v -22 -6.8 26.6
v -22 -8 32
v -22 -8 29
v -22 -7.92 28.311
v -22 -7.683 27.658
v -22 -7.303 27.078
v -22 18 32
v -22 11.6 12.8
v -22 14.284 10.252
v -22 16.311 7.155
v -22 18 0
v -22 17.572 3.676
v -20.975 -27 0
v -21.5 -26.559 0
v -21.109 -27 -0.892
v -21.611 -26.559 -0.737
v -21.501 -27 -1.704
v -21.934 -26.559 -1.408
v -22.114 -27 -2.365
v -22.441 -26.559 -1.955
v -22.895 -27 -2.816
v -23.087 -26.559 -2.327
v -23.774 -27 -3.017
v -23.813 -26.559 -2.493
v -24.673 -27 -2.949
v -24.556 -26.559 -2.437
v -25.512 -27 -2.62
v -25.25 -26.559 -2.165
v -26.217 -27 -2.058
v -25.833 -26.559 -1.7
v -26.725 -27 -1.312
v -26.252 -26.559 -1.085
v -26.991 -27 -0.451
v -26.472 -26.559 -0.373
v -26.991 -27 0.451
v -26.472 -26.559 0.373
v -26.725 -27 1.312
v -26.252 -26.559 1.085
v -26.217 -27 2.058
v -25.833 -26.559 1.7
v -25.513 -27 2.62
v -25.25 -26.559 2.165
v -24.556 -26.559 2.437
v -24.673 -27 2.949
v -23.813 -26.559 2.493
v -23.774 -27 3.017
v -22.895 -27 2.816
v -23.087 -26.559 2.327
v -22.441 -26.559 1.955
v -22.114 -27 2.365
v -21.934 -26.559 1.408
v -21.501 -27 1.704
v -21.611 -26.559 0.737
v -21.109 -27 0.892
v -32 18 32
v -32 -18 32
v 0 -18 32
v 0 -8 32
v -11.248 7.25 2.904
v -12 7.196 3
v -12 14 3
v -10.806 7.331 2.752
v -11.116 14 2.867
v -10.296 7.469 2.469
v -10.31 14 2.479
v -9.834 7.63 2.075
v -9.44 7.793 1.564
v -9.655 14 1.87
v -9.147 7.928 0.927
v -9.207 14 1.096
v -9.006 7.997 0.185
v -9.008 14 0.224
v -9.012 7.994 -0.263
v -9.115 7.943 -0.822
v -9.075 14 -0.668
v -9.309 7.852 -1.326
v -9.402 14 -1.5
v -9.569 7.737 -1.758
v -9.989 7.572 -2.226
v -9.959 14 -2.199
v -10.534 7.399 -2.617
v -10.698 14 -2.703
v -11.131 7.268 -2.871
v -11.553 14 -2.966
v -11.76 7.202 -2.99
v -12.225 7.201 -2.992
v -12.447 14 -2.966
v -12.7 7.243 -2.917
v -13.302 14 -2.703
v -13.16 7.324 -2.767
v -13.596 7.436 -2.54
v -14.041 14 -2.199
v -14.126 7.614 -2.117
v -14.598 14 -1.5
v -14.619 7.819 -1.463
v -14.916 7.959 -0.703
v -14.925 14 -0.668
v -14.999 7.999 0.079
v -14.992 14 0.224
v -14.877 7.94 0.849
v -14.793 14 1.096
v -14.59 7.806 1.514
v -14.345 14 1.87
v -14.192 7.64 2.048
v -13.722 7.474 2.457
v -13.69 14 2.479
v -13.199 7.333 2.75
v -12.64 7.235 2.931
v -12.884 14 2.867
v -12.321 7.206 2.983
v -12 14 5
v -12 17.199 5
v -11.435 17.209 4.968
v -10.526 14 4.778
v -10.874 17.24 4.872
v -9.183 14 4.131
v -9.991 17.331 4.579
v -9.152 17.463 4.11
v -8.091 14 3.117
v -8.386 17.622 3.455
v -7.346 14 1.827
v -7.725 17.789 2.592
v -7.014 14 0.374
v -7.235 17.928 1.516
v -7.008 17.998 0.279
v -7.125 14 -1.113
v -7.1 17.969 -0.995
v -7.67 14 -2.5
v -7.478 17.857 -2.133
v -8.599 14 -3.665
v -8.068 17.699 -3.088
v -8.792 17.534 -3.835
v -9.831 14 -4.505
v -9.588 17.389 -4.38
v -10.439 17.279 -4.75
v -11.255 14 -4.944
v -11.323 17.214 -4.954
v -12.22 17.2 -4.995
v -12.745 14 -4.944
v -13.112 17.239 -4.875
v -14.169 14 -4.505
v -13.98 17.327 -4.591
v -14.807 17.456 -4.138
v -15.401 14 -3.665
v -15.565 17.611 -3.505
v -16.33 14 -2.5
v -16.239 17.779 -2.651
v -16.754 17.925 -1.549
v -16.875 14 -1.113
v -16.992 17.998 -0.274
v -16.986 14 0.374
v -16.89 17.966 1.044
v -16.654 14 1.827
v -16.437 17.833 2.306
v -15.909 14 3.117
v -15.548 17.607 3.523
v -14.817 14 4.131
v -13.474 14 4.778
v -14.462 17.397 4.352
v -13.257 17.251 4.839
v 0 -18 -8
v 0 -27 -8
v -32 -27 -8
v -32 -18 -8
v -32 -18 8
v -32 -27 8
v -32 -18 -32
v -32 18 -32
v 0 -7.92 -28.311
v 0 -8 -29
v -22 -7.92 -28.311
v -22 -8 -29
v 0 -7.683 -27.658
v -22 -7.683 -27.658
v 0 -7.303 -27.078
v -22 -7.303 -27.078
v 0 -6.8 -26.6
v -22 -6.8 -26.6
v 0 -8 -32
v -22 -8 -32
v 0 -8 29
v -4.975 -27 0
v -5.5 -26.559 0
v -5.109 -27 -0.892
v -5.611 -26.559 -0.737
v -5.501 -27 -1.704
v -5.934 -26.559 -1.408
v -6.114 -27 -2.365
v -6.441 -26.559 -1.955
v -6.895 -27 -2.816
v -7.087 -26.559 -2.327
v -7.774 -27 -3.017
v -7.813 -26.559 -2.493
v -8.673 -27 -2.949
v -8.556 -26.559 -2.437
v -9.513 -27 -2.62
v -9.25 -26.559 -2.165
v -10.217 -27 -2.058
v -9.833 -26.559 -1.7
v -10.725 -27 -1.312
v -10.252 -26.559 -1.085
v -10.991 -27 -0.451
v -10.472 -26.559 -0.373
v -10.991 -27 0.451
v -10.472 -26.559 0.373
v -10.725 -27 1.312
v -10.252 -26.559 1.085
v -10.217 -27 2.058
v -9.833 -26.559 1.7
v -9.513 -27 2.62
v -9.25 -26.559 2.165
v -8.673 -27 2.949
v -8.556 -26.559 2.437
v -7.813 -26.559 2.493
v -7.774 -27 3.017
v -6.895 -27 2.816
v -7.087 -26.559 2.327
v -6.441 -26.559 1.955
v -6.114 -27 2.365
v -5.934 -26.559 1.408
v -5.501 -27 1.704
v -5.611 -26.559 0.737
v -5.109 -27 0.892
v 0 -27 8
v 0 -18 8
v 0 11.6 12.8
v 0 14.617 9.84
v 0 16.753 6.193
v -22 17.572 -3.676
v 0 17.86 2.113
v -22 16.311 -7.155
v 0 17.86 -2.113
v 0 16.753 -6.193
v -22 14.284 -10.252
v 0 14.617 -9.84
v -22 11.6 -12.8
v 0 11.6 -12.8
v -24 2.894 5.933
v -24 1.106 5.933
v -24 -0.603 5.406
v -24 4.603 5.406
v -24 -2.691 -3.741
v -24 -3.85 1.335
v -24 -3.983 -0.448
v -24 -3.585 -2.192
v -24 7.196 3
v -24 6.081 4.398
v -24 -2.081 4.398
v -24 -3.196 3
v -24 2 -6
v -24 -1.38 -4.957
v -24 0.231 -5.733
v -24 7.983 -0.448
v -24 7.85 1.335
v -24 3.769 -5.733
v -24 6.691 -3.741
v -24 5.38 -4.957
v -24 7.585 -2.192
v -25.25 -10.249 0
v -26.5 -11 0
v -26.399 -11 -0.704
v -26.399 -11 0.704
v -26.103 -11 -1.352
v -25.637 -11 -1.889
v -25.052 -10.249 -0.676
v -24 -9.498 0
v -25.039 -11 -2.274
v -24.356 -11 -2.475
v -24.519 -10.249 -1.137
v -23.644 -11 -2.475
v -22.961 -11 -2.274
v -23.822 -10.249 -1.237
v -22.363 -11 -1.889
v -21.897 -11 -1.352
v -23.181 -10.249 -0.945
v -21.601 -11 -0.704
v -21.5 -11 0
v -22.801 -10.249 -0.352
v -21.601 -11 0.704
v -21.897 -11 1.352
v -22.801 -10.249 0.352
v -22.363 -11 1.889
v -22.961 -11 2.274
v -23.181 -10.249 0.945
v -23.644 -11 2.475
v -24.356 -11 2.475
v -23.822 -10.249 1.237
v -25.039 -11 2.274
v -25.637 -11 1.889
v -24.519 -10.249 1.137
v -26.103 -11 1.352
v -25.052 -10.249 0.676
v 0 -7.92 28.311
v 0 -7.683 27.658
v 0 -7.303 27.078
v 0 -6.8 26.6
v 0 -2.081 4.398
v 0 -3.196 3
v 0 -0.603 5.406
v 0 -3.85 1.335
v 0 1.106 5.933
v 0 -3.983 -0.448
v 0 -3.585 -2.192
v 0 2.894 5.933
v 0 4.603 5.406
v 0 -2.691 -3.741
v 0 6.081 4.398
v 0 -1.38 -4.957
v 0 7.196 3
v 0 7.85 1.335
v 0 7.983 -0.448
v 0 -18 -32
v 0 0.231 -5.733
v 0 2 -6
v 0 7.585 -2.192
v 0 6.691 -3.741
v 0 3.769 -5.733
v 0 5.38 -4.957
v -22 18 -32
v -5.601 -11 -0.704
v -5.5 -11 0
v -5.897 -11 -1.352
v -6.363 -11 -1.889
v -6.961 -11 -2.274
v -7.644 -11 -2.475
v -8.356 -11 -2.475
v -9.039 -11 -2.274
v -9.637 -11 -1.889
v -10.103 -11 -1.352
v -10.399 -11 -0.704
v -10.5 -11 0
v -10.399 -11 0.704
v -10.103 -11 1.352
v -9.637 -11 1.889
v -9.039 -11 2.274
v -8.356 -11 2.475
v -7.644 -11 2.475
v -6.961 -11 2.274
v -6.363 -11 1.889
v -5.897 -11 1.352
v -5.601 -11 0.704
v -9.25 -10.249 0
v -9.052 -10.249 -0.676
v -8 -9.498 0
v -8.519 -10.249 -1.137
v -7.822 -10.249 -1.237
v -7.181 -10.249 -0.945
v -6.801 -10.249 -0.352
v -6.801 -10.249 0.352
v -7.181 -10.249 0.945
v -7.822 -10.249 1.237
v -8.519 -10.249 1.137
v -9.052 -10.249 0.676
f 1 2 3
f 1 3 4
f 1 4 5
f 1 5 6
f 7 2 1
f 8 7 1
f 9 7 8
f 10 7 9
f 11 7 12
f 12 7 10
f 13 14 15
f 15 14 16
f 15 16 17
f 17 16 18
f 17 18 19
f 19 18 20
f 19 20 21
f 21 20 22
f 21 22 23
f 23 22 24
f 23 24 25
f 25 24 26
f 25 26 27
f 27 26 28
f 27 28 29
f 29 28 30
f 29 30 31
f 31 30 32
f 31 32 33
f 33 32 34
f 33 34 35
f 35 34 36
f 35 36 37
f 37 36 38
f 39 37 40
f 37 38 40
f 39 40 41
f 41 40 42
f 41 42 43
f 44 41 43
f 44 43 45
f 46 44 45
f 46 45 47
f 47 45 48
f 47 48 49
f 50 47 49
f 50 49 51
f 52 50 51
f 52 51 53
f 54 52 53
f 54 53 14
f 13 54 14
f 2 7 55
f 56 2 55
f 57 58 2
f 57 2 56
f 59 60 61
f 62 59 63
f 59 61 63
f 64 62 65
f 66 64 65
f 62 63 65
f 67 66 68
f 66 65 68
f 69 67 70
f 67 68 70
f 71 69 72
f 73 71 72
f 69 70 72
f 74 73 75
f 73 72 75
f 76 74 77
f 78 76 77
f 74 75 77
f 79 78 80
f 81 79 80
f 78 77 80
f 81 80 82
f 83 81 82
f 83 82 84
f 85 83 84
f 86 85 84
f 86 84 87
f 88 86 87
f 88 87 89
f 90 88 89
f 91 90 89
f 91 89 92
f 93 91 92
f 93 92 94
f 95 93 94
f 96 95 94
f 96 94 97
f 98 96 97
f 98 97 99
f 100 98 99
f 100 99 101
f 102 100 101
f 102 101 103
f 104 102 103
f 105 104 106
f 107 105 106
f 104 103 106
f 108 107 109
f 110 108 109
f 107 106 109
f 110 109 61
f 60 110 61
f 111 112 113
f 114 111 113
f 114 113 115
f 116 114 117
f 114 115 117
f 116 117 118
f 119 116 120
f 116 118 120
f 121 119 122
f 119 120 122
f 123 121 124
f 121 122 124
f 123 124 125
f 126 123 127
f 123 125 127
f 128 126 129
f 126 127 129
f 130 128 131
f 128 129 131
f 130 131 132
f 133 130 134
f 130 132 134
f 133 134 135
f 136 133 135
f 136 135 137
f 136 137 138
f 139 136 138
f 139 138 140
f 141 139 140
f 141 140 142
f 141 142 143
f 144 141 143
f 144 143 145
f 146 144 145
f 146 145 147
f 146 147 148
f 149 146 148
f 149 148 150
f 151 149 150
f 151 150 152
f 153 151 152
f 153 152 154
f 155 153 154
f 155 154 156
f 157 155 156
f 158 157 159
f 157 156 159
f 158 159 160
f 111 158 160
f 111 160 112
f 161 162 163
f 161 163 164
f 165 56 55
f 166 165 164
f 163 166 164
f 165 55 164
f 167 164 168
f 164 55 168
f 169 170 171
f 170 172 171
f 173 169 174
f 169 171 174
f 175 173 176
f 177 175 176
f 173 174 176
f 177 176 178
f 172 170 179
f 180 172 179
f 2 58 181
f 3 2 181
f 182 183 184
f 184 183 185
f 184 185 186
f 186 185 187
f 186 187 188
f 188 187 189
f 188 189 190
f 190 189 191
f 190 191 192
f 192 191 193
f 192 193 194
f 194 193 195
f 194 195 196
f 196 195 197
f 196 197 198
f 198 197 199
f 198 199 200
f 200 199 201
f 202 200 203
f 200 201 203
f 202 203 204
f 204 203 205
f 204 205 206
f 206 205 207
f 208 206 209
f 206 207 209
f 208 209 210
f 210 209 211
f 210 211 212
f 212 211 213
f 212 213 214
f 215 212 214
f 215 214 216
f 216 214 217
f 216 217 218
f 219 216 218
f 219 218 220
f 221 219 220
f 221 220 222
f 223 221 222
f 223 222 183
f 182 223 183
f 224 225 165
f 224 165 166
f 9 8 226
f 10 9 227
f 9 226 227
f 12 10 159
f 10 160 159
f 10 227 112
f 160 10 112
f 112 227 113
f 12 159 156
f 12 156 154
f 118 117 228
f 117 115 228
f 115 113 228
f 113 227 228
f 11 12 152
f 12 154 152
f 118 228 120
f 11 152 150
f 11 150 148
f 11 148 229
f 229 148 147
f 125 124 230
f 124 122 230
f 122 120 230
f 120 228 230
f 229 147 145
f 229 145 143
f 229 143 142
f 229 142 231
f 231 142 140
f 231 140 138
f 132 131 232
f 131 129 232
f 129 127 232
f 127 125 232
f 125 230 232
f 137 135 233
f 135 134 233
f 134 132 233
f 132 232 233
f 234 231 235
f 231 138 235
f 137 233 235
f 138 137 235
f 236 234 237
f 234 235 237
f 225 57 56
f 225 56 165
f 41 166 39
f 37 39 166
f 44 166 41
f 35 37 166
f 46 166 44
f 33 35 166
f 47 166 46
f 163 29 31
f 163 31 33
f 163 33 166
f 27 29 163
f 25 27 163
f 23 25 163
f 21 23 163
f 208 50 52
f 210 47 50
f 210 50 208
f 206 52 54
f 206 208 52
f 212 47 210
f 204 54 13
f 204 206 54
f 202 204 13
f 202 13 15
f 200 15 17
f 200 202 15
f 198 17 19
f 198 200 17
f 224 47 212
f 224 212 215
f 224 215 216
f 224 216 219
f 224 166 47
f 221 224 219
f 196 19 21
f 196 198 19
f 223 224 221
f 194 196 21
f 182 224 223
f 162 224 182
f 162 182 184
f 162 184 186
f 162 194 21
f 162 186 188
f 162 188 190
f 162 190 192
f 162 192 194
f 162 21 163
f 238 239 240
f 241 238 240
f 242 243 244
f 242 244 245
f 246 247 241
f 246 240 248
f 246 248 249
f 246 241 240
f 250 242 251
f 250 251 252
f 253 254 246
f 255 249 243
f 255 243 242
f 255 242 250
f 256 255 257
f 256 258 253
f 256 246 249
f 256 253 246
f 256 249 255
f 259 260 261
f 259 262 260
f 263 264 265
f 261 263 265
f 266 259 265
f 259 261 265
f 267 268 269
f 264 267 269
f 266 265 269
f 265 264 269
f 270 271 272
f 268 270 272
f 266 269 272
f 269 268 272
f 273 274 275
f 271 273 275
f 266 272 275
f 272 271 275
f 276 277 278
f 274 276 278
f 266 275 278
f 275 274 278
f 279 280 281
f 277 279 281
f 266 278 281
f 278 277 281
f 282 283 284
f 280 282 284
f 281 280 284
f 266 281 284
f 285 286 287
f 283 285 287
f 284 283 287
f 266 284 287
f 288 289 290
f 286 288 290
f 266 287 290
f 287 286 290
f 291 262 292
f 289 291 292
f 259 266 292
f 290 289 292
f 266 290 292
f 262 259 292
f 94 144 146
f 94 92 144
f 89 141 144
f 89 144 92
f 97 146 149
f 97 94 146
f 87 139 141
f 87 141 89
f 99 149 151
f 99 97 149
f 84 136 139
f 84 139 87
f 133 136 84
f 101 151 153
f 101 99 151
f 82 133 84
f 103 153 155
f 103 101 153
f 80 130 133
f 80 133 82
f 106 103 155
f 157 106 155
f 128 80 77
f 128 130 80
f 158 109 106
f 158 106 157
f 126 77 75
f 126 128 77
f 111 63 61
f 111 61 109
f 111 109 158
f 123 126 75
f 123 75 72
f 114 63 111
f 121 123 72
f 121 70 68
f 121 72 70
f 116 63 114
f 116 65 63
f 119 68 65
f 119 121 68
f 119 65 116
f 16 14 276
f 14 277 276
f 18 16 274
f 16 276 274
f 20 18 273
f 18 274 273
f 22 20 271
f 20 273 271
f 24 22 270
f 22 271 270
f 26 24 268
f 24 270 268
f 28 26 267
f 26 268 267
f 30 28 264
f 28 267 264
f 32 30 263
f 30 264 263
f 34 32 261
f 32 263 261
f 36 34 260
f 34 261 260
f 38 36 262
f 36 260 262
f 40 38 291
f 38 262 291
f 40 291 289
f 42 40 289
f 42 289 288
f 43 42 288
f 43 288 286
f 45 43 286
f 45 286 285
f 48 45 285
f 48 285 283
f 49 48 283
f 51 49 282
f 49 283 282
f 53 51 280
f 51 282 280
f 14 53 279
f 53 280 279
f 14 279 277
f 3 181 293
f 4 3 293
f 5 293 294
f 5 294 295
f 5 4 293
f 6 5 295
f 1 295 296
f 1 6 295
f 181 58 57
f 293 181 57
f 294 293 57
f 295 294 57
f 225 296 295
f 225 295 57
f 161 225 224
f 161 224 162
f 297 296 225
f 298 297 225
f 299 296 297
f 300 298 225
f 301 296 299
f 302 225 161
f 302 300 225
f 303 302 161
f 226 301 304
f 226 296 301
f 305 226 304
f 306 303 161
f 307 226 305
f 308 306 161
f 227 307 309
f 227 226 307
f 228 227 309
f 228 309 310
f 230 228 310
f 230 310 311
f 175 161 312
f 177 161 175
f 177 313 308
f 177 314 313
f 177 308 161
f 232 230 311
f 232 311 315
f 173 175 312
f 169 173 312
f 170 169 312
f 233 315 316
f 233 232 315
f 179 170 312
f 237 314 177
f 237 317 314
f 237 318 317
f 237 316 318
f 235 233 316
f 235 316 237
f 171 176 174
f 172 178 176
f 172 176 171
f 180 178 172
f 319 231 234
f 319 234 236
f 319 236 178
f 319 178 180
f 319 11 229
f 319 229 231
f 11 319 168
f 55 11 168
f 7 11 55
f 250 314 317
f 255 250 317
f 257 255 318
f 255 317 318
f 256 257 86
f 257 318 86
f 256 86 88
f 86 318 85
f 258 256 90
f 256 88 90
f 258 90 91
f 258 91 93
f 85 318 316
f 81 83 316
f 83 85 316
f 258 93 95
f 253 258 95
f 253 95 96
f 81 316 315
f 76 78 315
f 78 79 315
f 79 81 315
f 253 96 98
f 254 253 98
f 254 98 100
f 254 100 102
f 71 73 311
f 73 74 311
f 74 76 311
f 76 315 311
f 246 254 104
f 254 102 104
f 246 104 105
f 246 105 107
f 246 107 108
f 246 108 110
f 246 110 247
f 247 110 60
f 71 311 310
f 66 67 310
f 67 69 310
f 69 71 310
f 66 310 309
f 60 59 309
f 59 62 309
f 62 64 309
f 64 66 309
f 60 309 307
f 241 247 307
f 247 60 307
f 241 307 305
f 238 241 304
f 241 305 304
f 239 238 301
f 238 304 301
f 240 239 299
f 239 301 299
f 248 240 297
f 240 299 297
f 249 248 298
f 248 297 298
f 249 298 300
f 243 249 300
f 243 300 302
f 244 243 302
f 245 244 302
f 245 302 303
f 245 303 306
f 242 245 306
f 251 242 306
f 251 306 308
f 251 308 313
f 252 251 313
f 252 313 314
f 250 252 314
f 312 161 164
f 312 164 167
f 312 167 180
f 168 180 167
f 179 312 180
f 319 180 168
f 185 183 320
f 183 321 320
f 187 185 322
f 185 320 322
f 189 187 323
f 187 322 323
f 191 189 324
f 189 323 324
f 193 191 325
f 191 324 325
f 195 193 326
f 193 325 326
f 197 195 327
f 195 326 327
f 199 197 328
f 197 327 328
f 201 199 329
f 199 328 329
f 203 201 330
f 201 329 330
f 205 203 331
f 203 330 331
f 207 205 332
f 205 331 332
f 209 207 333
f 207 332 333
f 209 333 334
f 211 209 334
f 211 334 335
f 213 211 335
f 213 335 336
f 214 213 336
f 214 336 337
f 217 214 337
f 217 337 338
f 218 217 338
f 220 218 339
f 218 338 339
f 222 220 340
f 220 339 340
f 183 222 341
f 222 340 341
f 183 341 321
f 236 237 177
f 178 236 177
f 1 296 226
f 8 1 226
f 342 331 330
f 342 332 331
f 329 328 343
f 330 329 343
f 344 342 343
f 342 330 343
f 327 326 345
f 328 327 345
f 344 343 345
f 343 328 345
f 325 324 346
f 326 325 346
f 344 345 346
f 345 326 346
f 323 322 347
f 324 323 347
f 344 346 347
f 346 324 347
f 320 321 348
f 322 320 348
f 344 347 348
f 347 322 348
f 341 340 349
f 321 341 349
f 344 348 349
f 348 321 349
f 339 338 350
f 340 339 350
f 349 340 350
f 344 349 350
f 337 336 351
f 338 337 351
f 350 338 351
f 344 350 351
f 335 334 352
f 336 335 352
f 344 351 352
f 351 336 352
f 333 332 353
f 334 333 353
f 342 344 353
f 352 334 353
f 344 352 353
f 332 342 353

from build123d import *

# Parameters (mm, degrees)
BOSS_EXTRUDE1_DEPTH             = 32
SKETCH3_OUTSIDE_W               = 82.906
SKETCH3_OUTSIDE_H               = 63.906
CUT_EXTRUDE1_DEPTH              = 22
SKETCH6_R                       = 6
CUT_EXTRUDE2_DEPTH              = 24
CUT_EXTRUDE3_REACH              = 65.82
CUT_EXTRUDE3_END_RADIUS         = 6
SKETCH7_R                       = 3
SKETCH8_R                       = 5
CUT_EXTRUDE4_DEPTH              = 4
M6X1_0_TAPPED_HOLE2_D           = 5
M6X1_0_TAPPED_HOLE2_DEPTH       = 16
M6X1_0_TAPPED_HOLE2_CSINK_D     = 6.05
M6X1_0_TAPPED_HOLE2_CSINK_ANGLE = 100
M6X1_0_TAPPED_HOLE2_TIP         = 1.502151548
FILLET1_R                       = 3


with BuildPart() as part:
    # Sketch1 → Boss-Extrude1 (new body)
    with BuildSketch(Plane(origin=(0, 0, 0), x_dir=(0, 0, -1), z_dir=(1, 0, 0))):
        Polygon((8, -18), (32, -18), (32, 18), (-32, 18), (-32, -18), (-8, -18), (-8, -27), (8, -27), align=None)
    extrude(amount=-BOSS_EXTRUDE1_DEPTH)

    # Sketch3 outside → Cut-Extrude1 (cut)
    with BuildSketch(Plane(origin=(0, 0, 0), x_dir=(0, 0, -1), z_dir=(1, 0, 0))):
        with Locations((0, -4.5)):
            Rectangle(SKETCH3_OUTSIDE_W, SKETCH3_OUTSIDE_H)
        with BuildLine():
            Line((-27.5, -8), (-12.8, 11.6))
            ThreePointArc((-12.8, 11.6), (0, 18), (12.8, 11.6))
            Line((12.8, 11.6), (27.5, -8))
            Line((27.5, -8), (32, -8))
            Line((32, -8), (32, -18))
            Line((32, -18), (8, -18))
            Line((8, -18), (8, -27))
            Line((8, -27), (-8, -27))
            Line((-8, -27), (-8, -18))
            Line((-8, -18), (-32, -18))
            Line((-32, -18), (-32, -8))
            Line((-32, -8), (-27.5, -8))
        make_face(mode=Mode.SUBTRACT)
    extrude(amount=-CUT_EXTRUDE1_DEPTH, mode=Mode.SUBTRACT)

    # Sketch6 → Cut-Extrude2 (cut)
    with BuildSketch(Plane(origin=(0, 0, 0), x_dir=(0, 0, -1), z_dir=(1, 0, 0))):
        with Locations((0, 2)):
            Circle(SKETCH6_R)
    extrude(amount=-CUT_EXTRUDE2_DEPTH, mode=Mode.SUBTRACT)

    # Cut-Extrude3: up to this cylinder (the profile starts outside it)
    cut_extrude3_end = Plane(origin=(-12, 2, 0), z_dir=(1, 0, 0)) * Cylinder(CUT_EXTRUDE3_END_RADIUS, 144.64, mode=Mode.PRIVATE)
    # Sketch7 → Cut-Extrude3 (cut, up to the surface)
    with BuildSketch(Plane(origin=(0, 18, 0), x_dir=(1, 0, 0), z_dir=(0, 1, 0)), mode=Mode.PRIVATE) as cut_extrude3_sk1:
        with Locations(Location((-12, 0, 0), (0, 0, 270))):
            Circle(SKETCH7_R)
    cut_extrude3_tool1 = extrude(cut_extrude3_sk1.sketch, amount=-CUT_EXTRUDE3_REACH, mode=Mode.PRIVATE) - cut_extrude3_end
    add(cut_extrude3_tool1.solids().sort_by_distance((-12, 18, 0))[0], mode=Mode.SUBTRACT)

    # Sketch8 → Cut-Extrude4 (cut)
    with BuildSketch(Plane(origin=(0, 18, 0), x_dir=(1, 0, 0), z_dir=(0, 1, 0))):
        with Locations(Location((-12, 0, 0), (0, 0, 270))):
            Circle(SKETCH8_R)
    extrude(amount=-CUT_EXTRUDE4_DEPTH, mode=Mode.SUBTRACT)

    # M6x1.0 Tapped Hole2
    with Locations(Plane(origin=(0, -27, 0), x_dir=(-1, 0, 0), z_dir=(0, -1, 0))):
        with Locations((8, 0), (24, 0)):
            CounterSinkHole(M6X1_0_TAPPED_HOLE2_D / 2, M6X1_0_TAPPED_HOLE2_CSINK_D / 2, depth=M6X1_0_TAPPED_HOLE2_DEPTH, counter_sink_angle=M6X1_0_TAPPED_HOLE2_CSINK_ANGLE)
            with Locations((0, 0, -(M6X1_0_TAPPED_HOLE2_DEPTH + M6X1_0_TAPPED_HOLE2_TIP / 2))):  # 118° drill point
                Cone(0, M6X1_0_TAPPED_HOLE2_D / 2, M6X1_0_TAPPED_HOLE2_TIP, mode=Mode.SUBTRACT)

    # Fillet1
    fillet1_edges = [part.edges().sort_by_distance(p)[0] for p in [
        (-11, -8, 27.5),
        (-11, -8, -27.5),
    ]]
    fillet(fillet1_edges, radius=FILLET1_R)


solid = part.part
